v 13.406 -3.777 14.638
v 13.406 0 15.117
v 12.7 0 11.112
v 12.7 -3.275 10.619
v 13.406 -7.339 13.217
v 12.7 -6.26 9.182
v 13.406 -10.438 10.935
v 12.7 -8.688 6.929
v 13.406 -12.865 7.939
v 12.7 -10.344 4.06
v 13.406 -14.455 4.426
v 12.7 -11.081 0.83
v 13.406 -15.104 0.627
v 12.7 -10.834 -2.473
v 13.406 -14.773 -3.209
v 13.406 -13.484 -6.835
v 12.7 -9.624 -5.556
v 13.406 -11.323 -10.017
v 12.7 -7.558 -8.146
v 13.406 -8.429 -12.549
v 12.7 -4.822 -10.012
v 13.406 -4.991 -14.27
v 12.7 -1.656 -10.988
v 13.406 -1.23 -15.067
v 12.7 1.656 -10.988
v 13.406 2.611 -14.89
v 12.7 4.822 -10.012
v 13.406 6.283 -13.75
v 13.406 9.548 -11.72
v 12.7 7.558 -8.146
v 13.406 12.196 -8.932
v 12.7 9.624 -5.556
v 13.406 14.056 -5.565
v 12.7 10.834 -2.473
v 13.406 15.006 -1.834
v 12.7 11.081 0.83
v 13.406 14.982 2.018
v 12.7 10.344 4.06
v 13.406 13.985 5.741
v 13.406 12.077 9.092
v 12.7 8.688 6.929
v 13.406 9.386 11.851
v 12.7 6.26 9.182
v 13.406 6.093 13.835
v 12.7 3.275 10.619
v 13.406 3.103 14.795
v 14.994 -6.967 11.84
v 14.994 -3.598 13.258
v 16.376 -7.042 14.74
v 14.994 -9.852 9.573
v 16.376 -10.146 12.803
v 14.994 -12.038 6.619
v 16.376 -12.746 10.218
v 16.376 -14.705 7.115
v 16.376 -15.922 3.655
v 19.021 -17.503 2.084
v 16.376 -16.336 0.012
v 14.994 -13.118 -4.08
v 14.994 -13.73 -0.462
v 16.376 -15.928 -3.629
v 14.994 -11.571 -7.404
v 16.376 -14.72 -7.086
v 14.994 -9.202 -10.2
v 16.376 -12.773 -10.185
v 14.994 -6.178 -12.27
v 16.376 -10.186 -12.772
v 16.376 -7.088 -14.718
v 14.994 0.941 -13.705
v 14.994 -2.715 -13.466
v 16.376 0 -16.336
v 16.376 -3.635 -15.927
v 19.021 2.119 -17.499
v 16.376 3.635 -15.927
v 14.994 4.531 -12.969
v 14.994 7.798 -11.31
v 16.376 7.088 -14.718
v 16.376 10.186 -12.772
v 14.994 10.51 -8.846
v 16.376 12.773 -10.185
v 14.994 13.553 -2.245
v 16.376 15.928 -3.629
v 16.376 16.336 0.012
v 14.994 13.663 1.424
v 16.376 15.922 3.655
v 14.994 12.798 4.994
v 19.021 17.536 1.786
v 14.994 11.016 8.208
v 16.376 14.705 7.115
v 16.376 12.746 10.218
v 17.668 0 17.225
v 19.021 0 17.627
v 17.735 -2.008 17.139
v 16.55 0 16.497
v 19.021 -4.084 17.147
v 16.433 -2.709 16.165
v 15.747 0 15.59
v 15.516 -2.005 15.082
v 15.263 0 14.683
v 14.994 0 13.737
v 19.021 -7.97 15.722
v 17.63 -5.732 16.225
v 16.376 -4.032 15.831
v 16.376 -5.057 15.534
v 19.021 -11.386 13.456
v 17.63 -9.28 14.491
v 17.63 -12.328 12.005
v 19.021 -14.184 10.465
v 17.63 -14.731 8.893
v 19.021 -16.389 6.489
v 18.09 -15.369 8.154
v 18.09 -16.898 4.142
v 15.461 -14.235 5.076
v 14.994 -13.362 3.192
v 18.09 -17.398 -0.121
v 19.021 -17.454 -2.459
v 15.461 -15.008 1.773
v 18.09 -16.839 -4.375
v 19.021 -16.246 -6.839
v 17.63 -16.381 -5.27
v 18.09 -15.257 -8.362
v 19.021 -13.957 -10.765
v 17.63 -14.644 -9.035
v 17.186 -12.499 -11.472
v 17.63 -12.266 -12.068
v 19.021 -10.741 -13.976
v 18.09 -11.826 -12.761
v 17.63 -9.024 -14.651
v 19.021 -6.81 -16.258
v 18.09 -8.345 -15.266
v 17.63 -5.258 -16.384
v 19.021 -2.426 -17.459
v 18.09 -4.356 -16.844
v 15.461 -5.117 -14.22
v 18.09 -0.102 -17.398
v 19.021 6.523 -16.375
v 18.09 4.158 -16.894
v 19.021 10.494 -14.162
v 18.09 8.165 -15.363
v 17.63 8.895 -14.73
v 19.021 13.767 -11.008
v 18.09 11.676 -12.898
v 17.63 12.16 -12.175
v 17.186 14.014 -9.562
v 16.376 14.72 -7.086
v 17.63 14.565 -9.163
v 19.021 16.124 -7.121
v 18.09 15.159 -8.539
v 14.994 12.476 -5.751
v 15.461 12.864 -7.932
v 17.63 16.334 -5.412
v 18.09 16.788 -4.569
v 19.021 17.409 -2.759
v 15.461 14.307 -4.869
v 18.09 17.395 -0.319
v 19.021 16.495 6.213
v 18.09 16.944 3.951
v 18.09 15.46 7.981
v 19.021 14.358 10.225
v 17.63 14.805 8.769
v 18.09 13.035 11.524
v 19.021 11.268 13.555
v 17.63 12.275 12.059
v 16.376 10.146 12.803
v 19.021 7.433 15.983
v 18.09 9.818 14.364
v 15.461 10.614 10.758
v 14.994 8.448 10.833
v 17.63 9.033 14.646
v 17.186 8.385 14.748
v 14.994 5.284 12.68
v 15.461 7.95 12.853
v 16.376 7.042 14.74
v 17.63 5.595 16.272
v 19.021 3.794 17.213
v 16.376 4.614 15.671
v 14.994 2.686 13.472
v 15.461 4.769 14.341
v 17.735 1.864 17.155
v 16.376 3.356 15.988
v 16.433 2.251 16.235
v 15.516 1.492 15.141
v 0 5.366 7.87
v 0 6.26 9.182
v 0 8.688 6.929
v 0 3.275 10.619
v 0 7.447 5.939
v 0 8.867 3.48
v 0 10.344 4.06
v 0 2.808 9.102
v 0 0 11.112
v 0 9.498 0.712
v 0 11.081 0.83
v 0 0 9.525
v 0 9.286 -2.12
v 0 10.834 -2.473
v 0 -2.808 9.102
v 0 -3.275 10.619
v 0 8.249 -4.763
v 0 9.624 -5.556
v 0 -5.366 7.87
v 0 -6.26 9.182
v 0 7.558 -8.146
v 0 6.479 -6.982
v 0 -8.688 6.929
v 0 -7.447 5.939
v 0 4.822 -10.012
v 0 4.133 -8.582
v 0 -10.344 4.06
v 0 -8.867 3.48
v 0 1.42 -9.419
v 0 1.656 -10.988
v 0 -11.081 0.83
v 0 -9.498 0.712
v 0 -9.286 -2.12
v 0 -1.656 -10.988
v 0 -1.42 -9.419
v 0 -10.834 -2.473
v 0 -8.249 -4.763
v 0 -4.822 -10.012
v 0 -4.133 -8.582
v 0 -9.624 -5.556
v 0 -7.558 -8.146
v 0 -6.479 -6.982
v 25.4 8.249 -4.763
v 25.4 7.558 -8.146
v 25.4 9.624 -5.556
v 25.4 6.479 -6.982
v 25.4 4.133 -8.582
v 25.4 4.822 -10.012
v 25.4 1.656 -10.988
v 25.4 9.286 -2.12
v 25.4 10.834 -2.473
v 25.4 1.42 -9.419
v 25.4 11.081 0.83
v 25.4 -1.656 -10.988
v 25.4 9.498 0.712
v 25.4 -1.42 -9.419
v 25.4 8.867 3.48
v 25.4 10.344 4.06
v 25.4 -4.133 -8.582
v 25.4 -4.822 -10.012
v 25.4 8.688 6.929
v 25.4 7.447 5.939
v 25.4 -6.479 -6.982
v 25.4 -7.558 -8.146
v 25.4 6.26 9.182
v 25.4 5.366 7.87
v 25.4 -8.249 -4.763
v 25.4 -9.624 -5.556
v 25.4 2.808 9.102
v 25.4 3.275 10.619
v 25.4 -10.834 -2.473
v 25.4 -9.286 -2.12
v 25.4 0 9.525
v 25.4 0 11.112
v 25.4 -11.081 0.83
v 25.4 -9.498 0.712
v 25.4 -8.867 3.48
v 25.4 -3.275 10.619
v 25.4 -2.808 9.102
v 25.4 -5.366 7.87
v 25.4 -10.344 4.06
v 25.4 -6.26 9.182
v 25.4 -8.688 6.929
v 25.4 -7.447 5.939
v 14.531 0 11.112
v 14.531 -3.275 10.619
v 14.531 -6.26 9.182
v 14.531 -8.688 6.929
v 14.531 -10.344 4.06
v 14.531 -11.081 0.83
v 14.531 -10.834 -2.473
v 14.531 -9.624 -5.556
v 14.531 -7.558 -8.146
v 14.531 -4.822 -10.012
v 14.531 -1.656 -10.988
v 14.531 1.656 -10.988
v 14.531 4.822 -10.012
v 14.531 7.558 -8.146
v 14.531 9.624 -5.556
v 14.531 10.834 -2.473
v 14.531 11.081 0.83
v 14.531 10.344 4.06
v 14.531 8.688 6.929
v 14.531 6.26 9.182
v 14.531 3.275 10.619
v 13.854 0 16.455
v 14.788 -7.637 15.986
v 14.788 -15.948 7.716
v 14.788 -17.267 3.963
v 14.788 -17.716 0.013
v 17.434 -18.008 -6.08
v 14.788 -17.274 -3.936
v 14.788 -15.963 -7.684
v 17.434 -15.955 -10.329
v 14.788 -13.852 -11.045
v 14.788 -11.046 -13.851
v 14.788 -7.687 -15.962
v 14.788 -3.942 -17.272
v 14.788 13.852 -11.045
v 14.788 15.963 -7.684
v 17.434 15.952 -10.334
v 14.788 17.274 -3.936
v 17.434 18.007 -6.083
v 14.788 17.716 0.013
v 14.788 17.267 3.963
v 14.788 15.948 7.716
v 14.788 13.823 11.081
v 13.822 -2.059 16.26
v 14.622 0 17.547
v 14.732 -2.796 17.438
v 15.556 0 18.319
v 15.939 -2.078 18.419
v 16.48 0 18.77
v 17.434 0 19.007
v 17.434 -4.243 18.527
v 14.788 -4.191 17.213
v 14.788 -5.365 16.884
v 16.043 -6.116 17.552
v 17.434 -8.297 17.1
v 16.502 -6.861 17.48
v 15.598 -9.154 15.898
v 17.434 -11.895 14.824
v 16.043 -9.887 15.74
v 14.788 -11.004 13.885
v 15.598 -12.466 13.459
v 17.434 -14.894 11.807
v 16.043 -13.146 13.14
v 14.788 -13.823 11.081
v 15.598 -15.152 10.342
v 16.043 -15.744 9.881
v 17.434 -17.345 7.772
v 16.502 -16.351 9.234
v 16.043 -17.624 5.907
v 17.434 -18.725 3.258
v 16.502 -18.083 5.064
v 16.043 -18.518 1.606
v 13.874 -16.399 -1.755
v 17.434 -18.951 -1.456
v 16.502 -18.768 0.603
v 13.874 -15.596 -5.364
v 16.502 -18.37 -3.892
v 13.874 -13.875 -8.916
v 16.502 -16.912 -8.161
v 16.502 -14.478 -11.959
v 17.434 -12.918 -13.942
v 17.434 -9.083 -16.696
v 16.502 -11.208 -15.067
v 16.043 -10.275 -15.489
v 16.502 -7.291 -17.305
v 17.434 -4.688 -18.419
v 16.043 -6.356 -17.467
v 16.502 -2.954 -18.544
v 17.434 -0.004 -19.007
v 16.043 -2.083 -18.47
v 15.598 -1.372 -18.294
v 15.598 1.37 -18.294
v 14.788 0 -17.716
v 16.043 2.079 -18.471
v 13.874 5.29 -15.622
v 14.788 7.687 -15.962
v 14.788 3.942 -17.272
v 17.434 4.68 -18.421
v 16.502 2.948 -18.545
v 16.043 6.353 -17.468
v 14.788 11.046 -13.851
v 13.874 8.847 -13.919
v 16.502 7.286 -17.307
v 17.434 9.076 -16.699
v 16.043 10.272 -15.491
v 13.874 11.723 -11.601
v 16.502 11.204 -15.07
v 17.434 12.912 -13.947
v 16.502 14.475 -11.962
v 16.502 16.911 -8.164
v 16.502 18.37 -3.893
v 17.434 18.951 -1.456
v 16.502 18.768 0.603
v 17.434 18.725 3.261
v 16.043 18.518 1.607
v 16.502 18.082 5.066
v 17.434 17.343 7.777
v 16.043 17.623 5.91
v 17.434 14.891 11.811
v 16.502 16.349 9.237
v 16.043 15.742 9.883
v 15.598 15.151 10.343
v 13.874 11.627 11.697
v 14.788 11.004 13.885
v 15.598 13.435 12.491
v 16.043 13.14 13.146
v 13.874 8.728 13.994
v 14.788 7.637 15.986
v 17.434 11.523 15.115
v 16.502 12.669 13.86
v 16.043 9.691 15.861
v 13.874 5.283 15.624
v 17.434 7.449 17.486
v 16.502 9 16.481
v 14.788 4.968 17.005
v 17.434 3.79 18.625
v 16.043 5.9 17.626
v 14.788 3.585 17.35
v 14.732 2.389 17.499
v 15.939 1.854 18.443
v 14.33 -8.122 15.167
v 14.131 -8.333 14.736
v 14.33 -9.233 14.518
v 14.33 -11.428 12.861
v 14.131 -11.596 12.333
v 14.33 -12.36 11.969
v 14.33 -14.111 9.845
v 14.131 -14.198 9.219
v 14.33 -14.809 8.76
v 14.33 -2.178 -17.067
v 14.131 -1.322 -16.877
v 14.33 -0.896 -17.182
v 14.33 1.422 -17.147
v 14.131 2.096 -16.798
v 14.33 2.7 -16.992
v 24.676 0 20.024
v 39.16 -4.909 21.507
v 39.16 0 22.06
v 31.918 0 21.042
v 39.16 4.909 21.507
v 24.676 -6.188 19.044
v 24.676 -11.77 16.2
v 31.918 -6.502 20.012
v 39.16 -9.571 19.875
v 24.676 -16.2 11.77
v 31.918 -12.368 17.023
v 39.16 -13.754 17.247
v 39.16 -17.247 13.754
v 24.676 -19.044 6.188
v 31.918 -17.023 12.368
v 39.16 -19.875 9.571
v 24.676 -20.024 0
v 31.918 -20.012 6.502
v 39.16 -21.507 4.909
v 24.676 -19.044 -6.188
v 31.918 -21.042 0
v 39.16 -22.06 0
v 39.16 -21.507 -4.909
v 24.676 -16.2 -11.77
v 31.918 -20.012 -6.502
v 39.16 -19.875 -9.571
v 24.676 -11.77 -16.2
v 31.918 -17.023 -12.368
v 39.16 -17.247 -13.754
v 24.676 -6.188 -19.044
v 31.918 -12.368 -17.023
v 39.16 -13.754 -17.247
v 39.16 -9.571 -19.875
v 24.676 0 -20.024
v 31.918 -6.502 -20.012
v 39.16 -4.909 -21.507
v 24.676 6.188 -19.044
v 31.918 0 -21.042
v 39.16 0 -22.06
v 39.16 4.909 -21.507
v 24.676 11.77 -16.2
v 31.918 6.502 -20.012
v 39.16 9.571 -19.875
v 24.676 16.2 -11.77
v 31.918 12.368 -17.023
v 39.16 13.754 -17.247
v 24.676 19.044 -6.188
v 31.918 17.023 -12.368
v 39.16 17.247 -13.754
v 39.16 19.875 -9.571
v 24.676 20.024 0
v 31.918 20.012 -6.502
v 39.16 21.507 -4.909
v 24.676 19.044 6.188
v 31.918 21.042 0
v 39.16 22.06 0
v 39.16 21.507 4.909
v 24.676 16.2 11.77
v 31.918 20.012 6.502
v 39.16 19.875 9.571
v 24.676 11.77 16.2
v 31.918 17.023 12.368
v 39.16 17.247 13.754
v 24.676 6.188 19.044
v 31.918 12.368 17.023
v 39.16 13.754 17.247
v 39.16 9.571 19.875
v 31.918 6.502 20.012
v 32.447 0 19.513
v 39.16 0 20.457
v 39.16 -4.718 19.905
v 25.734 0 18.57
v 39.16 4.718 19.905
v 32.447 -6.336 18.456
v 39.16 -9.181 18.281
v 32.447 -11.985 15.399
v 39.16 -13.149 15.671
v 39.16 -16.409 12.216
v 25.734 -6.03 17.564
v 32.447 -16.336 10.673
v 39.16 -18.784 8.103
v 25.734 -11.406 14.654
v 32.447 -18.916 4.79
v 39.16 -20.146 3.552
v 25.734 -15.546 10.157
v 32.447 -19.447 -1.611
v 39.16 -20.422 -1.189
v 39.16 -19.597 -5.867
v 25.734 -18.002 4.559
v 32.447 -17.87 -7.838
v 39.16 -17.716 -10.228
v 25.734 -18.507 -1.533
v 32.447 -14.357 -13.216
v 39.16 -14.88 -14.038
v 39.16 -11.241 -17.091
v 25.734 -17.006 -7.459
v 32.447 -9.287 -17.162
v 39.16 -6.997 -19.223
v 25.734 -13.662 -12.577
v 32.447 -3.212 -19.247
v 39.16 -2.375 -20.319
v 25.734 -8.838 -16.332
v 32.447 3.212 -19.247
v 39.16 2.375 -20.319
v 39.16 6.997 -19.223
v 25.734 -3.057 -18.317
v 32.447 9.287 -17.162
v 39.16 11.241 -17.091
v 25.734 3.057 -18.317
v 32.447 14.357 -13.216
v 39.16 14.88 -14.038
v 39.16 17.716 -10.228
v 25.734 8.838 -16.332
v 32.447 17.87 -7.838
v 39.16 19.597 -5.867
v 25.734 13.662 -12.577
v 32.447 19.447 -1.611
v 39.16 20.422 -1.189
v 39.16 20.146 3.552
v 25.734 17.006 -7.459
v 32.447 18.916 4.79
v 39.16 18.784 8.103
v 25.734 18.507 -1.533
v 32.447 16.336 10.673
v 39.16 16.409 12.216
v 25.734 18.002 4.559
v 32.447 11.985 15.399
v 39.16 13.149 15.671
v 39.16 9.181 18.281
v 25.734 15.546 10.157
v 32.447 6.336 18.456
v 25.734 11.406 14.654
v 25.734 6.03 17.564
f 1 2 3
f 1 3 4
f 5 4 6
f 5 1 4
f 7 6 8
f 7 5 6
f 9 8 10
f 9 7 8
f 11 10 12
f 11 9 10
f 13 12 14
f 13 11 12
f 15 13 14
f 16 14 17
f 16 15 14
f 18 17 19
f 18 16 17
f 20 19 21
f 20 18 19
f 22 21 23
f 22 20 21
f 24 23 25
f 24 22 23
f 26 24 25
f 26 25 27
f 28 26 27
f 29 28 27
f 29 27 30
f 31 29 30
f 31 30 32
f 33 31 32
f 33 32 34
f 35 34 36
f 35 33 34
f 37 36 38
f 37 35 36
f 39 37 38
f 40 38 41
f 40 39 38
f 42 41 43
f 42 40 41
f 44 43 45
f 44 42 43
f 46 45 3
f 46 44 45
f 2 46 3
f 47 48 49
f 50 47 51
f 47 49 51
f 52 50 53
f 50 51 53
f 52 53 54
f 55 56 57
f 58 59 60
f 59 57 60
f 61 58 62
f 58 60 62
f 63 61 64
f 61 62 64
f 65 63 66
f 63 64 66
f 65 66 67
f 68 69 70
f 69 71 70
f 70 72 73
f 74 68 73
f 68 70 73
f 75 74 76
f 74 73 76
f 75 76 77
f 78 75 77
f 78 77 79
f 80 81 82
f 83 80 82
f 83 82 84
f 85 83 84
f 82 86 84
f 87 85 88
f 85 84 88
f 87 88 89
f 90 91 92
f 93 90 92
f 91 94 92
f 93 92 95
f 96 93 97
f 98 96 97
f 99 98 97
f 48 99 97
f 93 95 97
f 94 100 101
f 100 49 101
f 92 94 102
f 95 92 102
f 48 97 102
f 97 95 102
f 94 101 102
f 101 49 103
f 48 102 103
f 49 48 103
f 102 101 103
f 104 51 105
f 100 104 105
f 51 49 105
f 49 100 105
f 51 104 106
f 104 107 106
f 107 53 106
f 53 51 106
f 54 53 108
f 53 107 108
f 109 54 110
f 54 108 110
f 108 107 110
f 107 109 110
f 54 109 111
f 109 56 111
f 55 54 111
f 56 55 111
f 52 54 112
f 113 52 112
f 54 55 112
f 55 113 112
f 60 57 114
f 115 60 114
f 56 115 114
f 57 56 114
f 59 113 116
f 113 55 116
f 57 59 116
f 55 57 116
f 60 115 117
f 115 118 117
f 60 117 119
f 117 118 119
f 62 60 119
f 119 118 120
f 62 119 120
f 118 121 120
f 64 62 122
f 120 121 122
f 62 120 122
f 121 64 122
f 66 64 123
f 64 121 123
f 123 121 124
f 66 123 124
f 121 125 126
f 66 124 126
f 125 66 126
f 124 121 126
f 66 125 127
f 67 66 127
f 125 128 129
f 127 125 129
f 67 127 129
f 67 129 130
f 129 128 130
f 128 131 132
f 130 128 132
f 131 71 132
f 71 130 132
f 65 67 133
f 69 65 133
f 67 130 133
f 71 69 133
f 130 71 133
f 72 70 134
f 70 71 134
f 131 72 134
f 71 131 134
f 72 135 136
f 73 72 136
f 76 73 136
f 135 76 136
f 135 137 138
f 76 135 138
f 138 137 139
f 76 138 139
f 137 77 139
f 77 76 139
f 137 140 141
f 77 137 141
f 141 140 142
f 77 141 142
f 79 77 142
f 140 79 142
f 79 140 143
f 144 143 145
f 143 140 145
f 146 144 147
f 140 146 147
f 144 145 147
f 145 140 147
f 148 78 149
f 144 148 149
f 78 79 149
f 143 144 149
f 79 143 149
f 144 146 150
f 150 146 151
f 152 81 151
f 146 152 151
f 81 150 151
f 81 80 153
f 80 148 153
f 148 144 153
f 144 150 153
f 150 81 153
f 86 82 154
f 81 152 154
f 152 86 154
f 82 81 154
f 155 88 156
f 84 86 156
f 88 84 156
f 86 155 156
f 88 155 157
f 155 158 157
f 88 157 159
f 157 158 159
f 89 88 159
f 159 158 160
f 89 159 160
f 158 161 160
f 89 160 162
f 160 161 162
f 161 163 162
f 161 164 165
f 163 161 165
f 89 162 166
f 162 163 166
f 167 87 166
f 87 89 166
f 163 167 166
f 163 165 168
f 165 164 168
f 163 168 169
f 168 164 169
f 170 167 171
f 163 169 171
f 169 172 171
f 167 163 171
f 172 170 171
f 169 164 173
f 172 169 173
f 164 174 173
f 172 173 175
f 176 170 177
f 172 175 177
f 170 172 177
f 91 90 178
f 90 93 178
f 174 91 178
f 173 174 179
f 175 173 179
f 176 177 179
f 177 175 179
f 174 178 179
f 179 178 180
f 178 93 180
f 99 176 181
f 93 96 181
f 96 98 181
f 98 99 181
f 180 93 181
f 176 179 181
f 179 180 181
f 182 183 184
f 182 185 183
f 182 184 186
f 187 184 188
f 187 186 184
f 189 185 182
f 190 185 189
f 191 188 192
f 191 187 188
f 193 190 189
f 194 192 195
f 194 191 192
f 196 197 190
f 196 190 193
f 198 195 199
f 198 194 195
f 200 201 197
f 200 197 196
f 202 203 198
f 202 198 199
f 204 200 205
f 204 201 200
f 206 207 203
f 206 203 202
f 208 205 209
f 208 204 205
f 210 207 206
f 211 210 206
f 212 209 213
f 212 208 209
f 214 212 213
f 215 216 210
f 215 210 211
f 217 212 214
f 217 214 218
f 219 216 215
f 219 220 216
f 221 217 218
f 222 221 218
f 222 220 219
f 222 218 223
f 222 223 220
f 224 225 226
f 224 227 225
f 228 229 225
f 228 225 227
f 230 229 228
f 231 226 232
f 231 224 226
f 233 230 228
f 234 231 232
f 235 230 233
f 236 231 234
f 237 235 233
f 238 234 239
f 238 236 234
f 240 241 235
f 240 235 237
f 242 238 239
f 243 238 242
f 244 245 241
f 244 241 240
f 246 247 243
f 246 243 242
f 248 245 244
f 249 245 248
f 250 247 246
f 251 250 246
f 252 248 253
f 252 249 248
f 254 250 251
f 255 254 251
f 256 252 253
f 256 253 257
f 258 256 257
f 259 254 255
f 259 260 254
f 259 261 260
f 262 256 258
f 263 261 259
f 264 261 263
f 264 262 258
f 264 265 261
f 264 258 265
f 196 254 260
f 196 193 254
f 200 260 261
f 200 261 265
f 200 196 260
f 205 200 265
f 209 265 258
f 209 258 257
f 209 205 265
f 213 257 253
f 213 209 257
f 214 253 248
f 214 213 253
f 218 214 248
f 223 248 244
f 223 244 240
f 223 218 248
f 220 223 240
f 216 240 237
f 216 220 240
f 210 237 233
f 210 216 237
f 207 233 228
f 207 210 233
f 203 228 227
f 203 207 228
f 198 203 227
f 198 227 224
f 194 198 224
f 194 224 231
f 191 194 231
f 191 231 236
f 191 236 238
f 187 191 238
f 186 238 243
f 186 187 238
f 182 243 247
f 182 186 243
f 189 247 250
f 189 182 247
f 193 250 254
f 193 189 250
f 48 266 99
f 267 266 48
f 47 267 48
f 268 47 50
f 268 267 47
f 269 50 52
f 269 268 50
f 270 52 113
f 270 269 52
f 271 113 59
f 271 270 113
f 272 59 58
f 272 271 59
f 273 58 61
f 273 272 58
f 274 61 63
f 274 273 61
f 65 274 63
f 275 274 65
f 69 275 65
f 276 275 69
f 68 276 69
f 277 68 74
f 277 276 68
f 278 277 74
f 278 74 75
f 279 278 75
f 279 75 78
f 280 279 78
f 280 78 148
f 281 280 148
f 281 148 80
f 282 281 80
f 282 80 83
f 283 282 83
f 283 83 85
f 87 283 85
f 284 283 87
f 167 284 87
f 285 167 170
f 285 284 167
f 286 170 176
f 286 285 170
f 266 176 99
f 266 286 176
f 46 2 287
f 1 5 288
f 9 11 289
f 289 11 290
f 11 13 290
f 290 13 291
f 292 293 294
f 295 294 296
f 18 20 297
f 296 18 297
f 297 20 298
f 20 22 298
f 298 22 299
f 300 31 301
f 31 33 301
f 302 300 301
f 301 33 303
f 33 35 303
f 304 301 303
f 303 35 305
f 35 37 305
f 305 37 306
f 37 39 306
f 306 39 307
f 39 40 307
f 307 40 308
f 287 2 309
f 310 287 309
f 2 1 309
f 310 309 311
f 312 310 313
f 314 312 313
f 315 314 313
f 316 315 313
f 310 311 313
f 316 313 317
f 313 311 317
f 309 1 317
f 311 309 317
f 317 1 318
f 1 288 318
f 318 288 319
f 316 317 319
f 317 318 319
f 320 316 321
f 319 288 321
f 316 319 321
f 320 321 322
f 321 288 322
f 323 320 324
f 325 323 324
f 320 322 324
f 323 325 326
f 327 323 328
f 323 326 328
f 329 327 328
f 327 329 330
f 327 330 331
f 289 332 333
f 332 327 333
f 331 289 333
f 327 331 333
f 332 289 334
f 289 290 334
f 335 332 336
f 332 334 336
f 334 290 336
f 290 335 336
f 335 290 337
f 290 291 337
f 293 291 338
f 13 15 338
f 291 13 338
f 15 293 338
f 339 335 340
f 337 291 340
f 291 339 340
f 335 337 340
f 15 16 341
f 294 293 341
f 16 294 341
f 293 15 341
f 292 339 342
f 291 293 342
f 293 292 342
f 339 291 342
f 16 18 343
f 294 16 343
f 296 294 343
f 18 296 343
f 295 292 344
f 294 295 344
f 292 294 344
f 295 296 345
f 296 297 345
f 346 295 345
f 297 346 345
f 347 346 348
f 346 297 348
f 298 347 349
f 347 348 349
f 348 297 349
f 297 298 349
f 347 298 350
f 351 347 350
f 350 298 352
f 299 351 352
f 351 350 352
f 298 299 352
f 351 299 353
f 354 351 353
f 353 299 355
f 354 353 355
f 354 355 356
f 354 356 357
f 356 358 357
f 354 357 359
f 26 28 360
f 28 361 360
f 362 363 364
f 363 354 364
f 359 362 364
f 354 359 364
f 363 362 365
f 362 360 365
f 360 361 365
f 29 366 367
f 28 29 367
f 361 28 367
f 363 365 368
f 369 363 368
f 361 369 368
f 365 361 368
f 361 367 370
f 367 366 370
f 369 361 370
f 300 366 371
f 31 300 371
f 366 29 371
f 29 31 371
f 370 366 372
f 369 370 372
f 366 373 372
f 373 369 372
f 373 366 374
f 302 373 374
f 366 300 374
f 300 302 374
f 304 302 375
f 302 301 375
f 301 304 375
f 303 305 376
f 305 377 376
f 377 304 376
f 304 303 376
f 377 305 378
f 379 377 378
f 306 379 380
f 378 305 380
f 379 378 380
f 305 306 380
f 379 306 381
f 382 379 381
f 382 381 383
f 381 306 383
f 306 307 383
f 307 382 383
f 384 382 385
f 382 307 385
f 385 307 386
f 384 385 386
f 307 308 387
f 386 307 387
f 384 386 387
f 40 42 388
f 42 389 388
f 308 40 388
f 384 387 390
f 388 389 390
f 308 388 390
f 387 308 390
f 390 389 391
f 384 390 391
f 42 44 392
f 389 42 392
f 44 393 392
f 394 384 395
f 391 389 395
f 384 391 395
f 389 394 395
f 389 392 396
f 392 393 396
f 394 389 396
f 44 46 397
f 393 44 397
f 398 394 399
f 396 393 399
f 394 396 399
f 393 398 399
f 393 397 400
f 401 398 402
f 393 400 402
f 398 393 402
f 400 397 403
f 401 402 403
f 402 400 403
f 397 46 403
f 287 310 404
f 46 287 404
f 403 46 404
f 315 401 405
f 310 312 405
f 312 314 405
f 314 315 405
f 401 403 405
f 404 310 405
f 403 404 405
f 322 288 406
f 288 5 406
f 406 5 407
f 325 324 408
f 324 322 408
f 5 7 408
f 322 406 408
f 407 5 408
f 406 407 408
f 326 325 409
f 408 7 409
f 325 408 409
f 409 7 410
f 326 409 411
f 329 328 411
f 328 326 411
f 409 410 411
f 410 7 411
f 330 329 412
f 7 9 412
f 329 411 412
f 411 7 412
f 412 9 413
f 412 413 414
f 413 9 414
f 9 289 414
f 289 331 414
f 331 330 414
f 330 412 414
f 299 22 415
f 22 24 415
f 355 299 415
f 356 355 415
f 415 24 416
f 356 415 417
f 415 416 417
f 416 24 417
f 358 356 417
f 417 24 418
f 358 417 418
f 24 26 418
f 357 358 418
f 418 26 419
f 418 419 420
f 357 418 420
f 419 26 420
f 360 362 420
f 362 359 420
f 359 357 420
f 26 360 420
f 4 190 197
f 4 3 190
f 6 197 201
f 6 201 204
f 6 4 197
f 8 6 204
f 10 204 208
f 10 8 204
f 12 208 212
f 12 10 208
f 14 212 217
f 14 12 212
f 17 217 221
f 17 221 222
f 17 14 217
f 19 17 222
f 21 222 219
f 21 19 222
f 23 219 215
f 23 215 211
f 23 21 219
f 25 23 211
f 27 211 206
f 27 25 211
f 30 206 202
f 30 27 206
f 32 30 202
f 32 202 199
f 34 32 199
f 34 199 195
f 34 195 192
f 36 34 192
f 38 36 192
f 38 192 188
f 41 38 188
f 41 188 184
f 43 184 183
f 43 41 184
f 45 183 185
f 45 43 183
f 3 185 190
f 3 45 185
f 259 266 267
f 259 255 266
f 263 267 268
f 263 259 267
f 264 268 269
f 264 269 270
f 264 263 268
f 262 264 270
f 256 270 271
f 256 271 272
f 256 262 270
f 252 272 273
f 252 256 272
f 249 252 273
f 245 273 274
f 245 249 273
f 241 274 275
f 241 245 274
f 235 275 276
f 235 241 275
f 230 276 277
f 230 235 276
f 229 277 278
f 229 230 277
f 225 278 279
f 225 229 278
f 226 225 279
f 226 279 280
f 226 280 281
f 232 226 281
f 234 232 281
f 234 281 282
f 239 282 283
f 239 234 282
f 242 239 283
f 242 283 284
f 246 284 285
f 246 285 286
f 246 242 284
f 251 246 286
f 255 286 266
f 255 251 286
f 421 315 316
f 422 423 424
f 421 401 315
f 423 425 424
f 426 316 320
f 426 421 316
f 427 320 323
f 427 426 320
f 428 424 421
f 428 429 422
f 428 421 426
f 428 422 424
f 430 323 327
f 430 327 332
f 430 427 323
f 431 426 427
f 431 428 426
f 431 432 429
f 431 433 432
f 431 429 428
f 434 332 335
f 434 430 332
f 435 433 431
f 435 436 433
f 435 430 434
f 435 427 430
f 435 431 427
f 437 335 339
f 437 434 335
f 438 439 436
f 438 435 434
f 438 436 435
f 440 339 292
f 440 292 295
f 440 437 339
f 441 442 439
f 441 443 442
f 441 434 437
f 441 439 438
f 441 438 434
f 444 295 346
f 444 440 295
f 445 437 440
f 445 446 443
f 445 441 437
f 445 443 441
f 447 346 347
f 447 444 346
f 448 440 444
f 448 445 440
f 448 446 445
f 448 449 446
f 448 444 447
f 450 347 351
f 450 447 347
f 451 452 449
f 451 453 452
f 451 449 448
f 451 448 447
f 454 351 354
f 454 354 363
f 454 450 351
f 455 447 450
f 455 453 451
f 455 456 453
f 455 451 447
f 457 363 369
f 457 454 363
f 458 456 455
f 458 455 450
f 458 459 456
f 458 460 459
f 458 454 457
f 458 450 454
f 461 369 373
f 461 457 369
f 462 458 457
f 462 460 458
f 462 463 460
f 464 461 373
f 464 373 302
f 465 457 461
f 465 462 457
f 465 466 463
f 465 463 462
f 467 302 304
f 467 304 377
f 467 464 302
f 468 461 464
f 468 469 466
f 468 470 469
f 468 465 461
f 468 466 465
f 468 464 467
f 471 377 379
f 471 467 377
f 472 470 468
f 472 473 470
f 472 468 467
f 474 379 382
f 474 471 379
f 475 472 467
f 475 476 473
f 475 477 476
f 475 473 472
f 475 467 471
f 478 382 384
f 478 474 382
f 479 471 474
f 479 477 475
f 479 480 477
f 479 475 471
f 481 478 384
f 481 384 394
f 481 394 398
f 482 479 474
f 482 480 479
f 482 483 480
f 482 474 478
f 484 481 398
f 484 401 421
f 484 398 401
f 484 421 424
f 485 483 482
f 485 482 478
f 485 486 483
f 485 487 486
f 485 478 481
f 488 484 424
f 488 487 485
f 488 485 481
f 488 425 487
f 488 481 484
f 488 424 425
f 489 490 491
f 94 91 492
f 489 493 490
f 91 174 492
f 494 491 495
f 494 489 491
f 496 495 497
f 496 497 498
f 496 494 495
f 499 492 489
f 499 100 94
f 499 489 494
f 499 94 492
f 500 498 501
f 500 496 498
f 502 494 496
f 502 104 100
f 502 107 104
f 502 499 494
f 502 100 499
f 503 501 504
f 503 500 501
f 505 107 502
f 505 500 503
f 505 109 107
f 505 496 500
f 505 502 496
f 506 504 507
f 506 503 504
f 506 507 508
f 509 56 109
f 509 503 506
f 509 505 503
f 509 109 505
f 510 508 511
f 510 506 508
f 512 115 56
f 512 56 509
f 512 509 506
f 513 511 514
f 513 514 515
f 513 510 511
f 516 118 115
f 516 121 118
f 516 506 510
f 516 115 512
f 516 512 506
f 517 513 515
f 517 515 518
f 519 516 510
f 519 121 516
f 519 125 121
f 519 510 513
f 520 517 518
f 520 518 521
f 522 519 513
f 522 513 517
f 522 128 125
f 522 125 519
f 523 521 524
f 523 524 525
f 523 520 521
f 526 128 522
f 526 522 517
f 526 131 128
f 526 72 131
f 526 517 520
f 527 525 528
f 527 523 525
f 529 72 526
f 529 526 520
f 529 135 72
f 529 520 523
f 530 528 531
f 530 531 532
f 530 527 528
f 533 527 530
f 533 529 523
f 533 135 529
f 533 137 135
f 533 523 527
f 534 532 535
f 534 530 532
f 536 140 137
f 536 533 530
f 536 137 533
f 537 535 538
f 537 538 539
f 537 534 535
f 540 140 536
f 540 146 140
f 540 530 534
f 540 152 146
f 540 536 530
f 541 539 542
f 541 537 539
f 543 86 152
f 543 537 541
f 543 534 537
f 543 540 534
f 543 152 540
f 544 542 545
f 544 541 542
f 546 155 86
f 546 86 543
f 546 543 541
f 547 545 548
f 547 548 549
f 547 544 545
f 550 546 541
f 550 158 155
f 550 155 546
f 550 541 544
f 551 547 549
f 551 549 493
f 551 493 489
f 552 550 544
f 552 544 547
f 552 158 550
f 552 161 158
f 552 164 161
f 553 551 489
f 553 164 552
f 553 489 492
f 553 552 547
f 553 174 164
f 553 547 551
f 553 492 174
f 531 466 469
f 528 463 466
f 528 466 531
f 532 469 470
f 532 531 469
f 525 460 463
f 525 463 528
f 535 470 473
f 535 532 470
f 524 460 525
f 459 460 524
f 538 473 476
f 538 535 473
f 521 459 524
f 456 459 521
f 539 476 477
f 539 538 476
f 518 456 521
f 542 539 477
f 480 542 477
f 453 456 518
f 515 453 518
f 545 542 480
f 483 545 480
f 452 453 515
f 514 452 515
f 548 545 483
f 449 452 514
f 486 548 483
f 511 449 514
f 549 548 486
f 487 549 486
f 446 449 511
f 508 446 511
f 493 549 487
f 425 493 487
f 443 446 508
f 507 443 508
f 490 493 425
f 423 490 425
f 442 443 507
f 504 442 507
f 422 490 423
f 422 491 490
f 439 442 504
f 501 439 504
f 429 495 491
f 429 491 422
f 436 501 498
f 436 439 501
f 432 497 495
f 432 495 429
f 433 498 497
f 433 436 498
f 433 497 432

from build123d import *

# Parameters (mm, degrees)
FILLET1_R = 4.7625


with BuildPart() as part:
    # Sketch1 → Revolve1 (revolve)
    with BuildSketch(Plane.XY, mode=Mode.PRIVATE) as revolve1_sk:
        Polygon((0, 11.1125), (12.7, 11.1125), (14.007022457, 18.524992696), (39.159831403, 22.059989461), (39.159831403, 20.456888189), (15.594522457, 17.145), (14.530829946, 11.1125), (25.4, 11.1125), (25.4, 9.525), (0, 9.525), align=None)
    revolve(revolve1_sk.sketch.rotate(Axis((0, 0, 0), (1, 0, 0)), 90), axis=Axis((0, 0, 0), (1, 0, 0)))

    # Fillet1
    fillet1_edges = [part.edges().sort_by_distance(p)[0] for p in [
        (14.007022457, 0, -18.524992696),
        (15.594522457, 0, -17.145),
    ]]
    fillet(fillet1_edges, radius=FILLET1_R)


solid = part.part
